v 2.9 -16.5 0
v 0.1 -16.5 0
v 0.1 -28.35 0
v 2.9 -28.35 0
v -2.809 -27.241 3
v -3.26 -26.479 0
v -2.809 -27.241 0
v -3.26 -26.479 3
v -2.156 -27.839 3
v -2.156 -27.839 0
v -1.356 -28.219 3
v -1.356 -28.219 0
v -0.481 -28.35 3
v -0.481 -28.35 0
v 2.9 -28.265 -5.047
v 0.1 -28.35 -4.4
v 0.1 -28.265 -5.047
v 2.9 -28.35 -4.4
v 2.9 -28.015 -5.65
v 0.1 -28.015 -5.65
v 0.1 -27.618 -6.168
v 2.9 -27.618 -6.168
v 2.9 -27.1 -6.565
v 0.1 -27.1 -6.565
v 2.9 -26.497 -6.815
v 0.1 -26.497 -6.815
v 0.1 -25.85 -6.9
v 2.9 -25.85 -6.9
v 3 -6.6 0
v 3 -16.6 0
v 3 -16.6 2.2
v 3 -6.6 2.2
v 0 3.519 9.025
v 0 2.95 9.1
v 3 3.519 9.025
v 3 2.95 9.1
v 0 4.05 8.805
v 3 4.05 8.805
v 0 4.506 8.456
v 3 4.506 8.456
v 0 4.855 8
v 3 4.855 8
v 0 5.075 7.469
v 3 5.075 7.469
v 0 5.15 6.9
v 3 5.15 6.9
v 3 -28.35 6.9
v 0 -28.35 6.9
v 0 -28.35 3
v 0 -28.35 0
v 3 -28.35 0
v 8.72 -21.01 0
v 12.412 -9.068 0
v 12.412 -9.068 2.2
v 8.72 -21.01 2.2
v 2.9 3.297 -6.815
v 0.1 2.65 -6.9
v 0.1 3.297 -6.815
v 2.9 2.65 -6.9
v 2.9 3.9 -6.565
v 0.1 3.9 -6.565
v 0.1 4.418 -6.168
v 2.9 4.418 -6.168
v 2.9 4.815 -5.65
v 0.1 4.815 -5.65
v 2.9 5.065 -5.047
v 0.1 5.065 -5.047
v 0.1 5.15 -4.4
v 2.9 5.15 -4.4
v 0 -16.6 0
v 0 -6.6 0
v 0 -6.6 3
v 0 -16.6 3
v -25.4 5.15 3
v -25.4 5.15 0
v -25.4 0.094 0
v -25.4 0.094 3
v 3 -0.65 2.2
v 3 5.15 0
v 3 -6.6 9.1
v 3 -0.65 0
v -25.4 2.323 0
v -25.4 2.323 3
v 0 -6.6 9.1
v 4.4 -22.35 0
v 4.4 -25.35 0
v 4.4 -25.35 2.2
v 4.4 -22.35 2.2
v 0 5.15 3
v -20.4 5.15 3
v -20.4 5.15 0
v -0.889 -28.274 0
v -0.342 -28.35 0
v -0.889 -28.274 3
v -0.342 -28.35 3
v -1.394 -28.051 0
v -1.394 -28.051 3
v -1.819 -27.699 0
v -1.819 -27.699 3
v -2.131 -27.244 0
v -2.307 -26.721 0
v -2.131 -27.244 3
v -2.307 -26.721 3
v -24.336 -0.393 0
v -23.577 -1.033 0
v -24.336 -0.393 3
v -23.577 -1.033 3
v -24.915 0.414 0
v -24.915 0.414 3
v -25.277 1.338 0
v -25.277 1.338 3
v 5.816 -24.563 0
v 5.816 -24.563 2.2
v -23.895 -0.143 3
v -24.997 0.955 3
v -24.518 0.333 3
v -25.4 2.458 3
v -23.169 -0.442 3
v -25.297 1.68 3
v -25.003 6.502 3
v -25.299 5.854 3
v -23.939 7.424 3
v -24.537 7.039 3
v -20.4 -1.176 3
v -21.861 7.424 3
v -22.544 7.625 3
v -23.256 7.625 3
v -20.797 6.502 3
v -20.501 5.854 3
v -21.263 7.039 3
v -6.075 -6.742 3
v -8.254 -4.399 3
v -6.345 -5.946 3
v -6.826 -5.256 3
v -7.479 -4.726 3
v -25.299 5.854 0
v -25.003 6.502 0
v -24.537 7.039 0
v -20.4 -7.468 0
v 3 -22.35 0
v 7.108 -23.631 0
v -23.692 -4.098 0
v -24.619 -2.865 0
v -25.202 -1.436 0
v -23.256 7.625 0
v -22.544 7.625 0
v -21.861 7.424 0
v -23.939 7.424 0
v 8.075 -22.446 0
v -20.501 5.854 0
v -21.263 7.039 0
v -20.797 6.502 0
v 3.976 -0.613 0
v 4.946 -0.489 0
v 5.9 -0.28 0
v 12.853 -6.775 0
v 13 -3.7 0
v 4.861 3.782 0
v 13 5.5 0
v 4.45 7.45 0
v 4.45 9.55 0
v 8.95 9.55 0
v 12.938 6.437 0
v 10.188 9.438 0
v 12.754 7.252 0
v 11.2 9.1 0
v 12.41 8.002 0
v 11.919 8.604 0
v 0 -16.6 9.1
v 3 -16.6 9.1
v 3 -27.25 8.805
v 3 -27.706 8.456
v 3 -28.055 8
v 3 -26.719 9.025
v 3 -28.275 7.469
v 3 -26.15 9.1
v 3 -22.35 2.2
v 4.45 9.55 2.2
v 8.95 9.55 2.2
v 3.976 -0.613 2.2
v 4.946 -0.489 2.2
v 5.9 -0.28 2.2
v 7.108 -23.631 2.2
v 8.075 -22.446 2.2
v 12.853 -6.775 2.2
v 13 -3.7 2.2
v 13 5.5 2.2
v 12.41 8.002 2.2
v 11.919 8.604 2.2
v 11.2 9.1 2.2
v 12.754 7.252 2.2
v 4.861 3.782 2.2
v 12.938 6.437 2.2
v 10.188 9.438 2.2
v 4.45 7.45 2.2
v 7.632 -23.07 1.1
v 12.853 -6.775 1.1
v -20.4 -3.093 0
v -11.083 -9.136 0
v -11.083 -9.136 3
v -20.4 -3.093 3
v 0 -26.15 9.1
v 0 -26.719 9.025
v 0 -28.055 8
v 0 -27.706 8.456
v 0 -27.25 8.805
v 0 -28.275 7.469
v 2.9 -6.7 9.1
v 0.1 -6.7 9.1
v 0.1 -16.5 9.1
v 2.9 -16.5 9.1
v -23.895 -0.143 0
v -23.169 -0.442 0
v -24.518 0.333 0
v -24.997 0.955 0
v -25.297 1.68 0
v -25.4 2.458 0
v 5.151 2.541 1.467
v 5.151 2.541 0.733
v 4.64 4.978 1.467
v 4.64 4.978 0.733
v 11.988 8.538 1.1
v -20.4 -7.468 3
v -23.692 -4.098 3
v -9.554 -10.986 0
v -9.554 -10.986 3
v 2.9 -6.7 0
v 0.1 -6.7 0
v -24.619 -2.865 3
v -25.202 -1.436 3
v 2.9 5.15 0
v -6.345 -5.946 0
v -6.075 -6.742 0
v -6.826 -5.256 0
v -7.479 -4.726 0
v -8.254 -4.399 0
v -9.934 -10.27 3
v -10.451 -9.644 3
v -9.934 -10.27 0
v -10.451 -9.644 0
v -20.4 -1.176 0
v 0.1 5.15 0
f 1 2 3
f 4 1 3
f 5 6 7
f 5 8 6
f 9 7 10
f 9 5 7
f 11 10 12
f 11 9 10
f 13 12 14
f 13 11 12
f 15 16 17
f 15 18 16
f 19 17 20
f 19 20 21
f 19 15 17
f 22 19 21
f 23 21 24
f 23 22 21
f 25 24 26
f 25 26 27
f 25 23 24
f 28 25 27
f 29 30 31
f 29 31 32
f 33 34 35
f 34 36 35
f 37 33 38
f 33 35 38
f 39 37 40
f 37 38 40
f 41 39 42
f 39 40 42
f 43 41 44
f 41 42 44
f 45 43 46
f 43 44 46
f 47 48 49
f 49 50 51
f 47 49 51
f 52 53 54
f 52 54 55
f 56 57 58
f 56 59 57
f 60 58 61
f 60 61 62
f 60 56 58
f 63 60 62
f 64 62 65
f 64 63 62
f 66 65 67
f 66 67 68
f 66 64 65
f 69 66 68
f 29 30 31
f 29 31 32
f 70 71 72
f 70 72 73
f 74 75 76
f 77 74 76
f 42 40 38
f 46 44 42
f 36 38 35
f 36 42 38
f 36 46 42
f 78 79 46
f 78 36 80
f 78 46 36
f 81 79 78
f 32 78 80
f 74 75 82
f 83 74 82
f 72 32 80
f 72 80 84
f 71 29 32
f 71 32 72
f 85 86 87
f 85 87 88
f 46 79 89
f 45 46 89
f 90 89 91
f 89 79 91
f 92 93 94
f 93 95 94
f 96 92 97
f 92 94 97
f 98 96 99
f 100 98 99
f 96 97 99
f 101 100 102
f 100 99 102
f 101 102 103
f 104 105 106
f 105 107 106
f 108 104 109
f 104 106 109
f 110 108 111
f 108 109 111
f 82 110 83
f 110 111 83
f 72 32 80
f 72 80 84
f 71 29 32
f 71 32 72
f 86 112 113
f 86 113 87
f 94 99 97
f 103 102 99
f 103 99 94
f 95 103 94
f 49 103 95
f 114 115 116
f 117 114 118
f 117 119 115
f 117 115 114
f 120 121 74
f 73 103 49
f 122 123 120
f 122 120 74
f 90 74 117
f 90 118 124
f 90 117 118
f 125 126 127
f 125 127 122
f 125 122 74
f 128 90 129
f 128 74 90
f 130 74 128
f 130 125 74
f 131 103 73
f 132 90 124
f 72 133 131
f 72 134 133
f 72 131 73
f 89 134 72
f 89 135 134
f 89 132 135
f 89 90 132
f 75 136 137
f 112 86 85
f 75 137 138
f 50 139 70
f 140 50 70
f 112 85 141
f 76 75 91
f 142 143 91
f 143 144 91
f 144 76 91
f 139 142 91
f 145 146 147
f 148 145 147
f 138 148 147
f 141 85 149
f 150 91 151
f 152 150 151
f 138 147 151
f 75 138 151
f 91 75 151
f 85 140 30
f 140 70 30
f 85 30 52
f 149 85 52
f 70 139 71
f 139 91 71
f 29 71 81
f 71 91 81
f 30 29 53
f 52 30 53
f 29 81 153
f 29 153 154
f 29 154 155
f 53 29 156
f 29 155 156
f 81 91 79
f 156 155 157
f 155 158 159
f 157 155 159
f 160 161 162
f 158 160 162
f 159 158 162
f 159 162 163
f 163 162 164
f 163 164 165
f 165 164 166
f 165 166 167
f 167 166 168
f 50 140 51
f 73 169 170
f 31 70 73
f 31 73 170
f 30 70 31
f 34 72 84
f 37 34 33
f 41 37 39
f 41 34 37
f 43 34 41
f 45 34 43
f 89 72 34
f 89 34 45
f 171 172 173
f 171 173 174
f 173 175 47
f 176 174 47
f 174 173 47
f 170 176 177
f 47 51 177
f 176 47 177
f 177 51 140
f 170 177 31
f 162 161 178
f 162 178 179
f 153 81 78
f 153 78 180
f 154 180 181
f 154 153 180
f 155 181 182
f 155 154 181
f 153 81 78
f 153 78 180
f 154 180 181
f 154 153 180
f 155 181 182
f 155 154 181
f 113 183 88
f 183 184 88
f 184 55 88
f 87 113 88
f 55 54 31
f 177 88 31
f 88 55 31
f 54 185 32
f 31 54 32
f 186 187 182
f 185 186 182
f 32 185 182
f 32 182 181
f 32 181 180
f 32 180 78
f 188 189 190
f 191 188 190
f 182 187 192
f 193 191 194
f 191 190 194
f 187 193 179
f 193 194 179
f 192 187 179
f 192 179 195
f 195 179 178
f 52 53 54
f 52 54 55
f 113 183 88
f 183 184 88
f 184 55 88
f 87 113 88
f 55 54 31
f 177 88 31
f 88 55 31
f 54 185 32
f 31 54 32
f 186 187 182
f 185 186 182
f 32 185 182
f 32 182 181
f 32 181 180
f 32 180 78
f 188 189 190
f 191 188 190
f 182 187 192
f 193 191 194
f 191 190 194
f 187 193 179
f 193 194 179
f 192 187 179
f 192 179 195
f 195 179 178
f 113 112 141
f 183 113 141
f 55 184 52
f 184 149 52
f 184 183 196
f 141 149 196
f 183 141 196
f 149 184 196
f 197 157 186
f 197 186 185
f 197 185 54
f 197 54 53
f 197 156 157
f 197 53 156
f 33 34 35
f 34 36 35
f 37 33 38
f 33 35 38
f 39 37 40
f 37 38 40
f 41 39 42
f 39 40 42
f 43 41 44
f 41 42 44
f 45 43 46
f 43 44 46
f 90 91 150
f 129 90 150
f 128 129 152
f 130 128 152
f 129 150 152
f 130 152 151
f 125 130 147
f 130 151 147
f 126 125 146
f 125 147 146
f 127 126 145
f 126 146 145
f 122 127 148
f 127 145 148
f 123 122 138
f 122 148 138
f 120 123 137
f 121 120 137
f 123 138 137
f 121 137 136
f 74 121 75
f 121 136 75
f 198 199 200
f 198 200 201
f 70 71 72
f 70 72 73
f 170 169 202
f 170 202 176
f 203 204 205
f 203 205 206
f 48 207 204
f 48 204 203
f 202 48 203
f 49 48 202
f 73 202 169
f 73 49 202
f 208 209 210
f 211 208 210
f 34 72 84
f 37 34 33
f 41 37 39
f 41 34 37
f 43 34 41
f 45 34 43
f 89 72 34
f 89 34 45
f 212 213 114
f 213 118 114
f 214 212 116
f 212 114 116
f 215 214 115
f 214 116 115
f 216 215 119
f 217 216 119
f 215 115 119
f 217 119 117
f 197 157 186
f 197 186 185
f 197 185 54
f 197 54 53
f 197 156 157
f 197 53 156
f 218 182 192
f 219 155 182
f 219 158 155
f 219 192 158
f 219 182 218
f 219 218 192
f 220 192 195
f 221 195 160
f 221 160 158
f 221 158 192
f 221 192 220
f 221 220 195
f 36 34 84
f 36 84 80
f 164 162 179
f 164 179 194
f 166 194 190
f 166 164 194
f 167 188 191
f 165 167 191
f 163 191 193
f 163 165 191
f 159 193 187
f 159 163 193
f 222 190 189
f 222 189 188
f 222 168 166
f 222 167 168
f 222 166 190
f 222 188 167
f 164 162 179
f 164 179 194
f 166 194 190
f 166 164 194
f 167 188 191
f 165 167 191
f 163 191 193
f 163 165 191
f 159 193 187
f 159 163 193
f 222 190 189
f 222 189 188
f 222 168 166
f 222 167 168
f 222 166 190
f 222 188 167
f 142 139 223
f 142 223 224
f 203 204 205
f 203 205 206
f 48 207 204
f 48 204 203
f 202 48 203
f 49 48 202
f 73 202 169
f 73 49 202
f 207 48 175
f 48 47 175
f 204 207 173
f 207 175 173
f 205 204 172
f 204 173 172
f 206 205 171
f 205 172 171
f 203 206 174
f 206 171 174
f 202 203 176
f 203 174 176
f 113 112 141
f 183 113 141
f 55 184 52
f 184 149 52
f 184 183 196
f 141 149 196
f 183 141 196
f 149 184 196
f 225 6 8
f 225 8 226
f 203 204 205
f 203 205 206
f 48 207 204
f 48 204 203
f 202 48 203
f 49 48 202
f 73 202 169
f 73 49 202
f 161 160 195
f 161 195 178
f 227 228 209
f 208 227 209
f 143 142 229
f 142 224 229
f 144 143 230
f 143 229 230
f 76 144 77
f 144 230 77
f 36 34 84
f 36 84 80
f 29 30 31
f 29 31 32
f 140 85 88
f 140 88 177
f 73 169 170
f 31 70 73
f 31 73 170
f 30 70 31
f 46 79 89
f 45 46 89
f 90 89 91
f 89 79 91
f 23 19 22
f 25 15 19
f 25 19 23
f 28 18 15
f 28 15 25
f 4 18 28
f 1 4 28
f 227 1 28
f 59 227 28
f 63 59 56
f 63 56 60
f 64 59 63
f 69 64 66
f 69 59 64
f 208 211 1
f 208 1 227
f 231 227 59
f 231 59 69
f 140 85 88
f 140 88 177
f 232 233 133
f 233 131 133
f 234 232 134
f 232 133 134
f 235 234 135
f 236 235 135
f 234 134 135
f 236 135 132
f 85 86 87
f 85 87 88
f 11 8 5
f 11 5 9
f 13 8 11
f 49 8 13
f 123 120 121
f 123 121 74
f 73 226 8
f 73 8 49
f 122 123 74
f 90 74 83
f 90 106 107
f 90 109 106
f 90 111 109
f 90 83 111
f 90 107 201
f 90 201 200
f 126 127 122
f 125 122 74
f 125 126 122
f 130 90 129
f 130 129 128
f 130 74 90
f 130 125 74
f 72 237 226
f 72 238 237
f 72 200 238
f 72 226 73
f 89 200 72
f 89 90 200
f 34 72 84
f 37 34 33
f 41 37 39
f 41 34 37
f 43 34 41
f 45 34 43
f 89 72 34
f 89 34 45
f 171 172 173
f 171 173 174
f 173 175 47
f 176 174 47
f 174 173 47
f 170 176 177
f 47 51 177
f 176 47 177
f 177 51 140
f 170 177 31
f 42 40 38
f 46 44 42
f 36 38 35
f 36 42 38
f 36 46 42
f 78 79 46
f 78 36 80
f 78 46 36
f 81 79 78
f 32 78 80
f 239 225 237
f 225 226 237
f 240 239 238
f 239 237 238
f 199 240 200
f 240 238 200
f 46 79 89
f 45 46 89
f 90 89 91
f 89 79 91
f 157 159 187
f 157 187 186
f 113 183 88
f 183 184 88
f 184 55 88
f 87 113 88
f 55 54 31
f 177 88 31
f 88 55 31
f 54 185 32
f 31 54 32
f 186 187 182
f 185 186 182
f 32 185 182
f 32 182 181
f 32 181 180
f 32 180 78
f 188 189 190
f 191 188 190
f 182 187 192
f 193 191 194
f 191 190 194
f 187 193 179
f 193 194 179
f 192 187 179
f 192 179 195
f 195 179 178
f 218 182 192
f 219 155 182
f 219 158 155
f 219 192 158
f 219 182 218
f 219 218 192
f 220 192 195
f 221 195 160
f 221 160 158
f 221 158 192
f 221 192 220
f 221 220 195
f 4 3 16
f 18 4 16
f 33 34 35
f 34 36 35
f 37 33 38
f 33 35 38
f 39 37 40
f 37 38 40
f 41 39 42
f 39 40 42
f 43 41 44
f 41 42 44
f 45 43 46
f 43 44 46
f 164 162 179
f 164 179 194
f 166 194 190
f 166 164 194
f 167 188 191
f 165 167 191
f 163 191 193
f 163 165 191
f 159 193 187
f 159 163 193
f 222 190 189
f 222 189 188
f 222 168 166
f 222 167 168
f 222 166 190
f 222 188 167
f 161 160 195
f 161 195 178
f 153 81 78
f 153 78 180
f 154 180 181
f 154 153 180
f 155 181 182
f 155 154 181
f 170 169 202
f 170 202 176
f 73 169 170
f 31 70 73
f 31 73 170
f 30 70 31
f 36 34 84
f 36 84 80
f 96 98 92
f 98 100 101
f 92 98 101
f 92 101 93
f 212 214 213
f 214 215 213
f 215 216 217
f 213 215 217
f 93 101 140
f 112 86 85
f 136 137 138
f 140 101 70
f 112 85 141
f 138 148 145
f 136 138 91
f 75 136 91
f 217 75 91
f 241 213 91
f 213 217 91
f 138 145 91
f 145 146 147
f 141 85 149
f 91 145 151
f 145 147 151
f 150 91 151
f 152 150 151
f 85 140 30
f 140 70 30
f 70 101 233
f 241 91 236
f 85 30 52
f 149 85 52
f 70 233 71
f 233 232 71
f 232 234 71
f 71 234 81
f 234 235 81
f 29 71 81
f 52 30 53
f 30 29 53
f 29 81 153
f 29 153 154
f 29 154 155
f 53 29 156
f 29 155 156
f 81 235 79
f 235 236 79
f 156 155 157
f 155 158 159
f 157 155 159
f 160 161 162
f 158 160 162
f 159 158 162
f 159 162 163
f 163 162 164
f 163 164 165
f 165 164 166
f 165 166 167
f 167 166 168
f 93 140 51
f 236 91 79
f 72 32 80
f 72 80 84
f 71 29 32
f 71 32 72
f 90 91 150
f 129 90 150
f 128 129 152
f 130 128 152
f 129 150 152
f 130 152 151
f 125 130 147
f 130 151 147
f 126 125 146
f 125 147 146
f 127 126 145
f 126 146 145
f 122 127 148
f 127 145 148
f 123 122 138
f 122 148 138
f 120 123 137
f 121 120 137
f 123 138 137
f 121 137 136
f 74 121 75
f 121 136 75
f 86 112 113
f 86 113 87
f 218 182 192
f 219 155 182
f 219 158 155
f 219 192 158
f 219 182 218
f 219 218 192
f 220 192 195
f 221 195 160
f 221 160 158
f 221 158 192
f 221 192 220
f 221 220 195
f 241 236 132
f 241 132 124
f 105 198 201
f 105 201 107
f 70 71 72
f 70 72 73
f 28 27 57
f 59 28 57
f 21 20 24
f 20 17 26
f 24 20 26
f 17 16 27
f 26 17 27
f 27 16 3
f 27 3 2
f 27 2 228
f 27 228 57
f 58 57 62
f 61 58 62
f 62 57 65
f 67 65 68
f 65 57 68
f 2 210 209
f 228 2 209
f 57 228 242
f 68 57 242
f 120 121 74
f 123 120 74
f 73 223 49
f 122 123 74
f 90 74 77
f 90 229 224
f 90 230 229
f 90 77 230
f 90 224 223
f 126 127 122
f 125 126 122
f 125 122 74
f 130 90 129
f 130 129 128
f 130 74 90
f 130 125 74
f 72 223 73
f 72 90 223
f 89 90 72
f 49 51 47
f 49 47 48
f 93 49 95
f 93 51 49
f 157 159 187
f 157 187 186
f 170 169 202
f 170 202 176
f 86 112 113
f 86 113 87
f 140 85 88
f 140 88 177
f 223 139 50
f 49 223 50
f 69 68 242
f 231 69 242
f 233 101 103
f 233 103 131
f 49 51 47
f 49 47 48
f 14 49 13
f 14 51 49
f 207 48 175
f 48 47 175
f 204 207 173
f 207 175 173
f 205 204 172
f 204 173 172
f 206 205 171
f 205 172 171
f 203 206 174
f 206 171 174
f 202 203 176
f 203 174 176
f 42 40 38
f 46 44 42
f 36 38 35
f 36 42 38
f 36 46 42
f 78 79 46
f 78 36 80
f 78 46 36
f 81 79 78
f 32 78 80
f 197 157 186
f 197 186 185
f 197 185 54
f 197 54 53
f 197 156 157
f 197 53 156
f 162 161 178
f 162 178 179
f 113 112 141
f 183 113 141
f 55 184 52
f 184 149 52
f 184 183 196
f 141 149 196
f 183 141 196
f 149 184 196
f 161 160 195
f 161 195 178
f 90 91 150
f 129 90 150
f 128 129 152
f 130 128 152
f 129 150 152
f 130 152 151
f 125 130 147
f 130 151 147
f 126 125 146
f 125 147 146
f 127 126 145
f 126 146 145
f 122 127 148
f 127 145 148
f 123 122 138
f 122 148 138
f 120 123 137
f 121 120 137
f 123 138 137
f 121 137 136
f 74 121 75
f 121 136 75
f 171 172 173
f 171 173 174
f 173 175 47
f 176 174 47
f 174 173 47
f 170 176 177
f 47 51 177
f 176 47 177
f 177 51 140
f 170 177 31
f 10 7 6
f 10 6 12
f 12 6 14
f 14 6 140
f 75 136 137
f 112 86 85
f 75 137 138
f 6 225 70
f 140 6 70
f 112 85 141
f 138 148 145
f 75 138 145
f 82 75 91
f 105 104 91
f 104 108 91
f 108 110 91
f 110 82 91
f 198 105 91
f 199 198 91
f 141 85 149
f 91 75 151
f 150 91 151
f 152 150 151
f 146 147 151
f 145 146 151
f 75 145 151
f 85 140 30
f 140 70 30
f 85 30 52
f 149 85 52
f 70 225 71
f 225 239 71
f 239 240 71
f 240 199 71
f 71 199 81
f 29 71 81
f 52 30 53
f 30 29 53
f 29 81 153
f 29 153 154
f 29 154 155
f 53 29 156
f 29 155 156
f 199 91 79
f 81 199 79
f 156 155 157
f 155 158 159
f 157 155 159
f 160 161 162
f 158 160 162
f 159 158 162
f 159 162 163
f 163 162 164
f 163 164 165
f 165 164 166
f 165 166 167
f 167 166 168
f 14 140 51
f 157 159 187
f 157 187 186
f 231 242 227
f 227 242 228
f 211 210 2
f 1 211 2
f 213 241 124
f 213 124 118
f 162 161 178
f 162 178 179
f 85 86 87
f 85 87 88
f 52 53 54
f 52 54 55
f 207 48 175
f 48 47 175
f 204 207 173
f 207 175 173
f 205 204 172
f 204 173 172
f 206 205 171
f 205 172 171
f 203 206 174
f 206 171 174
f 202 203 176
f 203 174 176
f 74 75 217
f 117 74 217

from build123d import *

# Parameters (mm, degrees)
PAD_DEPTH    = 2.2
SKETCH001_W  = 3
SKETCH001_H  = 11.75
PAD001_DEPTH = 6.9
FILLET_R     = 2.2
PAD002_DEPTH = 3
FILLET001_R  = 6
PAD003_DEPTH = 2.2
SKETCH004_W  = 3
SKETCH004_H  = 11.75
PAD004_DEPTH = 6.9
FILLET002_R  = 2.2
PAD005_DEPTH = 3
FILLET007_R  = 4
FILLET008_R  = 3
PAD006_DEPTH = 2.2
SKETCH007_W  = 3
SKETCH007_H  = 11.75
PAD007_DEPTH = 6.9
FILLET004_R  = 2.2
PAD008_DEPTH = 3
FILLET005_R  = 2
FILLET006_R  = 3
PAD009_START = 0.1
PAD009_DEPTH = 2.8
FILLET009_R  = 2.5


with BuildPart() as heavy:
    # Sketch → Pad (new body)
    with BuildSketch(Plane.XY):
        with BuildLine():
            Line((3, -16.6), (3, -6.6))
            Line((3, -6.6), (0, -6.6))
            Line((0, -6.6), (0, 0))
            Line((0, 0), (0, 5.15))
            Line((0, 5.15), (3, 5.15))
            Line((3, 5.15), (3, -0.65))
            ThreePointArc((3, -0.65), (4.462352, -0.561816), (5.9, -0.28))
            add(Edge.make_bspline(
                [(5.9, -0.28), (5.061626, 2.873724), (4.45, 4.820279), (4.45, 7.45)],
                knots=[0, 0, 0, 0, 1, 1, 1, 1], degree=3))
            Line((4.45, 7.45), (4.45, 9.55))
            Line((4.45, 9.55), (8.95, 9.55))
            add(Edge.make_bspline(
                [(8.95, 9.55), (13, 9.55), (13, 5.5)],
                knots=[0, 0, 0, 1, 1, 1], degree=2))
            Line((13, 5.5), (13, -3.7))
            add(Edge.make_bspline(
                [(13, -3.7), (13, -7.166449), (12.412182, -9.067731)],
                knots=[0, 0, 0, 1, 1, 1], degree=2))
            Line((12.412182, -9.067731), (8.72, -21.01))
            add(Edge.make_bspline(
                [(5.816198, -24.563372), (7.995686, -23.352775), (8.72, -21.01)],
                knots=[0, 0, 0, 1, 1, 1], degree=2))
            Line((5.816198, -24.563372), (4.4, -25.35))
            Line((4.4, -25.35), (4.4, -22.35))
            Line((4.4, -22.35), (3, -22.35))
            Line((3, -22.35), (3, -28.35))
            Line((3, -28.35), (0, -28.35))
            Line((0, -28.35), (0, -16.6))
            Line((0, -16.6), (3, -16.6))
        make_face()
    extrude(amount=PAD_DEPTH)

    # Sketch001 (on Face24 of Pad) → Pad001 (join)
    with BuildSketch(Plane.XY.offset(2.2)):
        with Locations((1.5, -22.475)):
            Rectangle(SKETCH001_W, SKETCH001_H)
        with Locations((1.5, -0.725)):
            Rectangle(SKETCH001_W, SKETCH001_H)
    extrude(amount=PAD001_DEPTH)

    # Fillet
    fillet_edges = [heavy.edges().sort_by_distance(p)[0] for p in [
        (1.5, 5.15, 9.1),
        (1.5, -28.35, 9.1),
    ]]
    fillet(fillet_edges, radius=FILLET_R)

    # Sketch002 → Pad002 (join)
    with BuildSketch(Plane.XY):
        with BuildLine():
            Line((0, 5.15), (-20.4, 5.15))
            ThreePointArc((-20.4, 5.15), (-22.9, 7.65), (-25.4, 5.15))
            Line((-25.4, 5.15), (-25.4, -2.35))
            Line((-20.4, -7.46811), (-25.4, -2.35))
            Line((-20.4, -7.46811), (0, -28.35))
            Line((0, 5.15), (0, -28.35))
        make_face()
    extrude(amount=PAD002_DEPTH)

    # Fillet001
    fillet001_edges = [heavy.edges().sort_by_distance(p)[0] for p in [
        (-25.4, -2.35, 1.5),
    ]]
    fillet(fillet001_edges, radius=FILLET001_R)


with BuildPart() as medium:
    # Sketch003 → Pad003 (new body)
    with BuildSketch(Plane.XY):
        with BuildLine():
            Line((3, -16.6), (3, -6.6))
            Line((3, -6.6), (0, -6.6))
            Line((0, -6.6), (0, 0))
            Line((0, 0), (0, 5.15))
            Line((0, 5.15), (3, 5.15))
            Line((3, 5.15), (3, -0.65))
            ThreePointArc((3, -0.65), (4.462352, -0.561816), (5.9, -0.28))
            add(Edge.make_bspline(
                [(5.9, -0.28), (5.061626, 2.873724), (4.45, 4.820279), (4.45, 7.45)],
                knots=[0, 0, 0, 0, 1, 1, 1, 1], degree=3))
            Line((4.45, 7.45), (4.45, 9.55))
            Line((4.45, 9.55), (8.95, 9.55))
            add(Edge.make_bspline(
                [(8.95, 9.55), (13, 9.55), (13, 5.5)],
                knots=[0, 0, 0, 1, 1, 1], degree=2))
            Line((13, 5.5), (13, -3.7))
            add(Edge.make_bspline(
                [(13, -3.7), (13, -7.166449), (12.412182, -9.067731)],
                knots=[0, 0, 0, 1, 1, 1], degree=2))
            Line((12.412182, -9.067731), (8.72, -21.01))
            add(Edge.make_bspline(
                [(5.816198, -24.563372), (7.995686, -23.352775), (8.72, -21.01)],
                knots=[0, 0, 0, 1, 1, 1], degree=2))
            Line((5.816198, -24.563372), (4.4, -25.35))
            Line((4.4, -25.35), (4.4, -22.35))
            Line((4.4, -22.35), (3, -22.35))
            Line((3, -22.35), (3, -28.35))
            Line((3, -28.35), (0, -28.35))
            Line((0, -28.35), (0, -16.6))
            Line((0, -16.6), (3, -16.6))
        make_face()
    extrude(amount=PAD003_DEPTH)

    # Sketch004 (on Face24 of Pad003) → Pad004 (join)
    with BuildSketch(Plane.XY.offset(2.2)):
        with Locations((1.5, -22.475)):
            Rectangle(SKETCH004_W, SKETCH004_H)
        with Locations((1.5, -0.725)):
            Rectangle(SKETCH004_W, SKETCH004_H)
    extrude(amount=PAD004_DEPTH)

    # Fillet002
    fillet002_edges = [medium.edges().sort_by_distance(p)[0] for p in [
        (1.5, 5.15, 9.1),
        (1.5, -28.35, 9.1),
    ]]
    fillet(fillet002_edges, radius=FILLET002_R)

    # Sketch005 → Pad005 (join)
    with BuildSketch(Plane.XY):
        with BuildLine():
            Line((0, 5.15), (-20.4, 5.15))
            ThreePointArc((-20.4, 5.15), (-22.9, 7.65), (-25.4, 5.15))
            Line((-25.4, 5.15), (-25.4, 0.15))
            Line((-20.4, -3.093091), (-25.4, 0.15))
            Line((-10.027719, -9.820741), (-20.4, -3.093091))
            Line((-2.5, -28.35), (-10.027719, -9.820741))
            Line((0, -28.35), (-2.5, -28.35))
            Line((0, 5.15), (0, -28.35))
        make_face()
    extrude(amount=PAD005_DEPTH)

    # Fillet007
    fillet007_edges = [medium.edges().sort_by_distance(p)[0] for p in [
        (-25.4, 0.15, 1.5),
        (-10.027719, -9.820741, 1.5),
    ]]
    fillet(fillet007_edges, radius=FILLET007_R)

    # Fillet008
    fillet008_edges = [medium.edges().sort_by_distance(p)[0] for p in [
        (-2.5, -28.35, 1.5),
    ]]
    fillet(fillet008_edges, radius=FILLET008_R)


with BuildPart() as light:
    # Sketch006 → Pad006 (new body)
    with BuildSketch(Plane.XY):
        with BuildLine():
            Line((3, -16.6), (3, -6.6))
            Line((3, -6.6), (0, -6.6))
            Line((0, -6.6), (0, 0))
            Line((0, 0), (0, 5.15))
            Line((0, 5.15), (3, 5.15))
            Line((3, 5.15), (3, -0.65))
            ThreePointArc((3, -0.65), (4.462352, -0.561816), (5.9, -0.28))
            add(Edge.make_bspline(
                [(5.9, -0.28), (5.061626, 2.873724), (4.45, 4.820279), (4.45, 7.45)],
                knots=[0, 0, 0, 0, 1, 1, 1, 1], degree=3))
            Line((4.45, 7.45), (4.45, 9.55))
            Line((4.45, 9.55), (8.95, 9.55))
            add(Edge.make_bspline(
                [(8.95, 9.55), (13, 9.55), (13, 5.5)],
                knots=[0, 0, 0, 1, 1, 1], degree=2))
            Line((13, 5.5), (13, -3.7))
            add(Edge.make_bspline(
                [(13, -3.7), (13, -7.166449), (12.412182, -9.067731)],
                knots=[0, 0, 0, 1, 1, 1], degree=2))
            Line((12.412182, -9.067731), (8.72, -21.01))
            add(Edge.make_bspline(
                [(5.816198, -24.563372), (7.995686, -23.352775), (8.72, -21.01)],
                knots=[0, 0, 0, 1, 1, 1], degree=2))
            Line((5.816198, -24.563372), (4.4, -25.35))
            Line((4.4, -25.35), (4.4, -22.35))
            Line((4.4, -22.35), (3, -22.35))
            Line((3, -22.35), (3, -28.35))
            Line((3, -28.35), (0, -28.35))
            Line((0, -28.35), (0, -16.6))
            Line((0, -16.6), (3, -16.6))
        make_face()
    extrude(amount=PAD006_DEPTH)

    # Sketch007 (on Face24 of Pad006) → Pad007 (join)
    with BuildSketch(Plane.XY.offset(2.2)):
        with Locations((1.5, -22.475)):
            Rectangle(SKETCH007_W, SKETCH007_H)
        with Locations((1.5, -0.725)):
            Rectangle(SKETCH007_W, SKETCH007_H)
    extrude(amount=PAD007_DEPTH)

    # Fillet004
    fillet004_edges = [light.edges().sort_by_distance(p)[0] for p in [
        (1.5, 5.15, 9.1),
        (1.5, -28.35, 9.1),
    ]]
    fillet(fillet004_edges, radius=FILLET004_R)

    # Sketch008 → Pad008 (join)
    with BuildSketch(Plane.XY):
        with BuildLine():
            Line((0, 5.15), (-20.4, 5.15))
            ThreePointArc((-20.4, 5.15), (-22.9, 7.65), (-25.4, 5.15))
            Line((-25.4, 5.15), (-25.4, 0.15))
            Line((-20.4, -1.17643), (-25.4, 0.15))
            Line((-6.425528, -4.88366), (-20.4, -1.17643))
            Line((-2, -28.35), (-6.425528, -4.88366))
            Line((0, -28.35), (-2, -28.35))
            Line((0, 5.15), (0, -28.35))
        make_face()
    extrude(amount=PAD008_DEPTH)

    # Fillet005
    fillet005_edges = [light.edges().sort_by_distance(p)[0] for p in [
        (-2, -28.35, 1.5),
    ]]
    fillet(fillet005_edges, radius=FILLET005_R)

    # Fillet006
    fillet006_edges = [light.edges().sort_by_distance(p)[0] for p in [
        (-6.425528, -4.88366, 1.5),
        (-25.4, 0.15, 1.5),
    ]]
    fillet(fillet006_edges, radius=FILLET006_R)


with BuildPart() as retainer:
    # Sketch009 → Pad009 (new body)
    with BuildSketch(Plane.YZ.offset(PAD009_START)):
        Polygon((-28.35, 0), (-28.35, -6.9), (5.15, -6.9), (5.15, 0), (-6.7, 0), (-6.7, 9.1), (-16.5, 9.1), (-16.5, 0), align=None)
    extrude(amount=PAD009_DEPTH)

    # Fillet009
    fillet009_edges = [retainer.edges().sort_by_distance(p)[0] for p in [
        (1.5, -28.35, -6.9),
        (1.5, 5.15, -6.9),
    ]]
    fillet(fillet009_edges, radius=FILLET009_R)


solid = Compound([heavy.part, medium.part, light.part, retainer.part])
